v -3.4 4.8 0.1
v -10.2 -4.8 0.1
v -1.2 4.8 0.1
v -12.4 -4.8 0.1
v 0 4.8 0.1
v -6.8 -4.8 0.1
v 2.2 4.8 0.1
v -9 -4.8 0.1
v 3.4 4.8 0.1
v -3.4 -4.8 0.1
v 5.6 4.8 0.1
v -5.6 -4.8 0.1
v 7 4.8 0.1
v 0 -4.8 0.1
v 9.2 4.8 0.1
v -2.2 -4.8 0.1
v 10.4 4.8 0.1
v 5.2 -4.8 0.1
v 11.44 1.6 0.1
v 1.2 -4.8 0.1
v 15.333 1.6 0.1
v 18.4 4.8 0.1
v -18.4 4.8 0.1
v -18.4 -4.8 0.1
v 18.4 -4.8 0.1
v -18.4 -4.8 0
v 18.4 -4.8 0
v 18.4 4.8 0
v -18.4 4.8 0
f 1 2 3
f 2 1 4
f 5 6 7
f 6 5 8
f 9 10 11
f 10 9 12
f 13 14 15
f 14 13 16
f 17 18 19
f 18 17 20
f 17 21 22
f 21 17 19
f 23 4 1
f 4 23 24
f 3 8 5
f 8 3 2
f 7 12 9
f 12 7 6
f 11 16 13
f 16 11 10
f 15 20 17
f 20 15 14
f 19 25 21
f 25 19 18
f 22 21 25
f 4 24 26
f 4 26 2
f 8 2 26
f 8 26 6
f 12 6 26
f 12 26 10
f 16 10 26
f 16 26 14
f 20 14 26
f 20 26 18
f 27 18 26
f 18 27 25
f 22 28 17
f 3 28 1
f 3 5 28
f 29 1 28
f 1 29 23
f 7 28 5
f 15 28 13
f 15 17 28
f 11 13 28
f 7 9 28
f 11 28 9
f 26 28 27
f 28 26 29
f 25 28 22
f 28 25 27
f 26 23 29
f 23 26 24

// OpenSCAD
// file: ../p/box3u12.scad
use <../lib.scad>
function ldraw_lib__box3u12() = [
// 0 Box with 3 Parallel Faces without Any Edges
// 0 Name: box3u12.dat
// 0 Author: J.C. Tchang [tchang]
// 0 !LDRAW_ORG Primitive UPDATE 2014-02
// 0 !LICENSE Licensed under CC BY 2.0 and CC BY 4.0 : see CAreadme.txt
// 
// 0 BFC CERTIFY CCW
  [0,"BFC","CERTIFY"],
  [0,"BFC","CCW"],
// 
// 0 !HISTORY 2014-12-23 [PTadmin] Official Update 2014-02
// 
// 
// 4 16 -1 1 1 1 1 1 1 1 -1 -1 1 -1
  [4,16,-1,1,1,1,1,1,1,1,-1,-1,1,-1],
// 4 16 -1 1 1 -1 0 1 1 0 1 1 1 1
  [4,16,-1,1,1,-1,0,1,1,0,1,1,1,1],
// 4 16 1 1 -1 1 0 -1 -1 0 -1 -1 1 -1
  [4,16,1,1,-1,1,0,-1,-1,0,-1,-1,1,-1],
];
module ldraw_lib__box3u12(step=0, col=false, unit=2/5, alt=false, line=0.2, solid=!$preview)
    makepoly(ldraw_lib__box3u12(), step=step, col=col, unit=unit, alt=alt, line=line, solid=solid);
ldraw_lib__box3u12(line=0.2);
// main file
use <../lib.scad>
use <../p/box3u12.scad>
function ldraw_lib__197905c() = [
// 0 Sticker  4.6 x  1.2 with Black Diagonal Stripes (Right)
// 0 Name: 197905c.dat
// 0 Author: Damien Roux [Darats]
// 0 !LDRAW_ORG Part UPDATE 2014-02
// 0 !LICENSE Licensed under CC BY 2.0 and CC BY 4.0 : see CAreadme.txt
// 
// 0 BFC CERTIFY CCW
  [0,"BFC","CERTIFY"],
  [0,"BFC","CCW"],
// 
// 0 !KEYWORDS Set 5510
// 
// 0 !HISTORY 2014-12-23 [PTadmin] Official Update 2014-02
// 
// 
// 4 0 -31 -0.25 -12 -25.5 -0.25 -12 -3 -0.25 12 -8.5 -0.25 12
  [4,0,-31,-0.25,-12,-25.5,-0.25,-12,-3,-0.25,12,-8.5,-0.25,12],
// 4 0 -22.5 -0.25 -12 -17 -0.25 -12 5.5 -0.25 12 0 -0.25 12
  [4,0,-22.5,-0.25,-12,-17,-0.25,-12,5.5,-0.25,12,0,-0.25,12],
// 4 0 -14 -0.25 -12 -8.5 -0.25 -12 14 -0.25 12 8.5 -0.25 12
  [4,0,-14,-0.25,-12,-8.5,-0.25,-12,14,-0.25,12,8.5,-0.25,12],
// 4 0 -5.5 -0.25 -12 0 -0.25 -12 23 -0.25 12 17.5 -0.25 12
  [4,0,-5.5,-0.25,-12,0,-0.25,-12,23,-0.25,12,17.5,-0.25,12],
// 4 0 26 -0.25 12 3 -0.25 -12 13 -0.25 -12 28.6 -0.25 4
  [4,0,26,-0.25,12,3,-0.25,-12,13,-0.25,-12,28.6,-0.25,4],
// 4 0 46 -0.25 12 26 -0.25 12 28.6 -0.25 4 38.333 -0.25 4
  [4,0,46,-0.25,12,26,-0.25,12,28.6,-0.25,4,38.333,-0.25,4],
// 4 16 -46 -0.25 -12 -31 -0.25 -12 -8.5 -0.25 12 -46 -0.25 12
  [4,16,-46,-0.25,-12,-31,-0.25,-12,-8.5,-0.25,12,-46,-0.25,12],
// 4 16 -25.5 -0.25 -12 -22.5 -0.25 -12 0 -0.25 12 -3 -0.25 12
  [4,16,-25.5,-0.25,-12,-22.5,-0.25,-12,0,-0.25,12,-3,-0.25,12],
// 4 16 -17 -0.25 -12 -14 -0.25 -12 8.5 -0.25 12 5.5 -0.25 12
  [4,16,-17,-0.25,-12,-14,-0.25,-12,8.5,-0.25,12,5.5,-0.25,12],
// 4 16 -8.5 -0.25 -12 -5.5 -0.25 -12 17.5 -0.25 12 14 -0.25 12
  [4,16,-8.5,-0.25,-12,-5.5,-0.25,-12,17.5,-0.25,12,14,-0.25,12],
// 4 16 0 -0.25 -12 3 -0.25 -12 26 -0.25 12 23 -0.25 12
  [4,16,0,-0.25,-12,3,-0.25,-12,26,-0.25,12,23,-0.25,12],
// 4 16 46 -0.25 -12 38.333 -0.25 4 28.6 -0.25 4 13 -0.25 -12
  [4,16,46,-0.25,-12,38.333,-0.25,4,28.6,-0.25,4,13,-0.25,-12],
// 3 16 46 -0.25 12 38.333 -0.25 4 46 -0.25 -12
  [3,16,46,-0.25,12,38.333,-0.25,4,46,-0.25,-12],
// 
// 3 16 -31 -0.25 -12 -46 -0.25 -12 -46 0 -12
  [3,16,-31,-0.25,-12,-46,-0.25,-12,-46,0,-12],
// 3 16 -31 -0.25 -12 -46 0 -12 -25.5 -0.25 -12
  [3,16,-31,-0.25,-12,-46,0,-12,-25.5,-0.25,-12],
// 3 16 -22.5 -0.25 -12 -25.5 -0.25 -12 -46 0 -12
  [3,16,-22.5,-0.25,-12,-25.5,-0.25,-12,-46,0,-12],
// 3 16 -22.5 -0.25 -12 -46 0 -12 -17 -0.25 -12
  [3,16,-22.5,-0.25,-12,-46,0,-12,-17,-0.25,-12],
// 3 16 -14 -0.25 -12 -17 -0.25 -12 -46 0 -12
  [3,16,-14,-0.25,-12,-17,-0.25,-12,-46,0,-12],
// 3 16 -14 -0.25 -12 -46 0 -12 -8.5 -0.25 -12
  [3,16,-14,-0.25,-12,-46,0,-12,-8.5,-0.25,-12],
// 3 16 -5.5 -0.25 -12 -8.5 -0.25 -12 -46 0 -12
  [3,16,-5.5,-0.25,-12,-8.5,-0.25,-12,-46,0,-12],
// 3 16 -5.5 -0.25 -12 -46 0 -12 0 -0.25 -12
  [3,16,-5.5,-0.25,-12,-46,0,-12,0,-0.25,-12],
// 3 16 3 -0.25 -12 0 -0.25 -12 -46 0 -12
  [3,16,3,-0.25,-12,0,-0.25,-12,-46,0,-12],
// 3 16 3 -0.25 -12 -46 0 -12 13 -0.25 -12
  [3,16,3,-0.25,-12,-46,0,-12,13,-0.25,-12],
// 4 16 13 -0.25 -12 -46 0 -12 46 0 -12 46 -0.25 -12
  [4,16,13,-0.25,-12,-46,0,-12,46,0,-12,46,-0.25,-12],
// 3 16 46 -0.25 12 46 0 12 26 -0.25 12
  [3,16,46,-0.25,12,46,0,12,26,-0.25,12],
// 3 16 -3 -0.25 12 46 0 12 -8.5 -0.25 12
  [3,16,-3,-0.25,12,46,0,12,-8.5,-0.25,12],
// 3 16 -3 -0.25 12 0 -0.25 12 46 0 12
  [3,16,-3,-0.25,12,0,-0.25,12,46,0,12],
// 4 16 -8.5 -0.25 12 46 0 12 -46 0 12 -46 -0.25 12
  [4,16,-8.5,-0.25,12,46,0,12,-46,0,12,-46,-0.25,12],
// 3 16 5.5 -0.25 12 46 0 12 0 -0.25 12
  [3,16,5.5,-0.25,12,46,0,12,0,-0.25,12],
// 3 16 23 -0.25 12 46 0 12 17.5 -0.25 12
  [3,16,23,-0.25,12,46,0,12,17.5,-0.25,12],
// 3 16 23 -0.25 12 26 -0.25 12 46 0 12
  [3,16,23,-0.25,12,26,-0.25,12,46,0,12],
// 3 16 14 -0.25 12 17.5 -0.25 12 46 0 12
  [3,16,14,-0.25,12,17.5,-0.25,12,46,0,12],
// 3 16 5.5 -0.25 12 8.5 -0.25 12 46 0 12
  [3,16,5.5,-0.25,12,8.5,-0.25,12,46,0,12],
// 3 16 14 -0.25 12 46 0 12 8.5 -0.25 12
  [3,16,14,-0.25,12,46,0,12,8.5,-0.25,12],
// 1 16 0 -0.25 0 0 0 46 0 0.25 0 -12 0 0 box3u12.dat
  [1,16,0,-0.25,0,0,0,46,0,0.25,0,-12,0,0, ldraw_lib__box3u12()],
];
module ldraw_lib__197905c(step=0, col=false, unit=2/5, alt=false, line=0.2, solid=!$preview)
    makepoly(ldraw_lib__197905c(), step=step, col=col, unit=unit, alt=alt, line=line, solid=solid);
ldraw_lib__197905c(line=0.2);
